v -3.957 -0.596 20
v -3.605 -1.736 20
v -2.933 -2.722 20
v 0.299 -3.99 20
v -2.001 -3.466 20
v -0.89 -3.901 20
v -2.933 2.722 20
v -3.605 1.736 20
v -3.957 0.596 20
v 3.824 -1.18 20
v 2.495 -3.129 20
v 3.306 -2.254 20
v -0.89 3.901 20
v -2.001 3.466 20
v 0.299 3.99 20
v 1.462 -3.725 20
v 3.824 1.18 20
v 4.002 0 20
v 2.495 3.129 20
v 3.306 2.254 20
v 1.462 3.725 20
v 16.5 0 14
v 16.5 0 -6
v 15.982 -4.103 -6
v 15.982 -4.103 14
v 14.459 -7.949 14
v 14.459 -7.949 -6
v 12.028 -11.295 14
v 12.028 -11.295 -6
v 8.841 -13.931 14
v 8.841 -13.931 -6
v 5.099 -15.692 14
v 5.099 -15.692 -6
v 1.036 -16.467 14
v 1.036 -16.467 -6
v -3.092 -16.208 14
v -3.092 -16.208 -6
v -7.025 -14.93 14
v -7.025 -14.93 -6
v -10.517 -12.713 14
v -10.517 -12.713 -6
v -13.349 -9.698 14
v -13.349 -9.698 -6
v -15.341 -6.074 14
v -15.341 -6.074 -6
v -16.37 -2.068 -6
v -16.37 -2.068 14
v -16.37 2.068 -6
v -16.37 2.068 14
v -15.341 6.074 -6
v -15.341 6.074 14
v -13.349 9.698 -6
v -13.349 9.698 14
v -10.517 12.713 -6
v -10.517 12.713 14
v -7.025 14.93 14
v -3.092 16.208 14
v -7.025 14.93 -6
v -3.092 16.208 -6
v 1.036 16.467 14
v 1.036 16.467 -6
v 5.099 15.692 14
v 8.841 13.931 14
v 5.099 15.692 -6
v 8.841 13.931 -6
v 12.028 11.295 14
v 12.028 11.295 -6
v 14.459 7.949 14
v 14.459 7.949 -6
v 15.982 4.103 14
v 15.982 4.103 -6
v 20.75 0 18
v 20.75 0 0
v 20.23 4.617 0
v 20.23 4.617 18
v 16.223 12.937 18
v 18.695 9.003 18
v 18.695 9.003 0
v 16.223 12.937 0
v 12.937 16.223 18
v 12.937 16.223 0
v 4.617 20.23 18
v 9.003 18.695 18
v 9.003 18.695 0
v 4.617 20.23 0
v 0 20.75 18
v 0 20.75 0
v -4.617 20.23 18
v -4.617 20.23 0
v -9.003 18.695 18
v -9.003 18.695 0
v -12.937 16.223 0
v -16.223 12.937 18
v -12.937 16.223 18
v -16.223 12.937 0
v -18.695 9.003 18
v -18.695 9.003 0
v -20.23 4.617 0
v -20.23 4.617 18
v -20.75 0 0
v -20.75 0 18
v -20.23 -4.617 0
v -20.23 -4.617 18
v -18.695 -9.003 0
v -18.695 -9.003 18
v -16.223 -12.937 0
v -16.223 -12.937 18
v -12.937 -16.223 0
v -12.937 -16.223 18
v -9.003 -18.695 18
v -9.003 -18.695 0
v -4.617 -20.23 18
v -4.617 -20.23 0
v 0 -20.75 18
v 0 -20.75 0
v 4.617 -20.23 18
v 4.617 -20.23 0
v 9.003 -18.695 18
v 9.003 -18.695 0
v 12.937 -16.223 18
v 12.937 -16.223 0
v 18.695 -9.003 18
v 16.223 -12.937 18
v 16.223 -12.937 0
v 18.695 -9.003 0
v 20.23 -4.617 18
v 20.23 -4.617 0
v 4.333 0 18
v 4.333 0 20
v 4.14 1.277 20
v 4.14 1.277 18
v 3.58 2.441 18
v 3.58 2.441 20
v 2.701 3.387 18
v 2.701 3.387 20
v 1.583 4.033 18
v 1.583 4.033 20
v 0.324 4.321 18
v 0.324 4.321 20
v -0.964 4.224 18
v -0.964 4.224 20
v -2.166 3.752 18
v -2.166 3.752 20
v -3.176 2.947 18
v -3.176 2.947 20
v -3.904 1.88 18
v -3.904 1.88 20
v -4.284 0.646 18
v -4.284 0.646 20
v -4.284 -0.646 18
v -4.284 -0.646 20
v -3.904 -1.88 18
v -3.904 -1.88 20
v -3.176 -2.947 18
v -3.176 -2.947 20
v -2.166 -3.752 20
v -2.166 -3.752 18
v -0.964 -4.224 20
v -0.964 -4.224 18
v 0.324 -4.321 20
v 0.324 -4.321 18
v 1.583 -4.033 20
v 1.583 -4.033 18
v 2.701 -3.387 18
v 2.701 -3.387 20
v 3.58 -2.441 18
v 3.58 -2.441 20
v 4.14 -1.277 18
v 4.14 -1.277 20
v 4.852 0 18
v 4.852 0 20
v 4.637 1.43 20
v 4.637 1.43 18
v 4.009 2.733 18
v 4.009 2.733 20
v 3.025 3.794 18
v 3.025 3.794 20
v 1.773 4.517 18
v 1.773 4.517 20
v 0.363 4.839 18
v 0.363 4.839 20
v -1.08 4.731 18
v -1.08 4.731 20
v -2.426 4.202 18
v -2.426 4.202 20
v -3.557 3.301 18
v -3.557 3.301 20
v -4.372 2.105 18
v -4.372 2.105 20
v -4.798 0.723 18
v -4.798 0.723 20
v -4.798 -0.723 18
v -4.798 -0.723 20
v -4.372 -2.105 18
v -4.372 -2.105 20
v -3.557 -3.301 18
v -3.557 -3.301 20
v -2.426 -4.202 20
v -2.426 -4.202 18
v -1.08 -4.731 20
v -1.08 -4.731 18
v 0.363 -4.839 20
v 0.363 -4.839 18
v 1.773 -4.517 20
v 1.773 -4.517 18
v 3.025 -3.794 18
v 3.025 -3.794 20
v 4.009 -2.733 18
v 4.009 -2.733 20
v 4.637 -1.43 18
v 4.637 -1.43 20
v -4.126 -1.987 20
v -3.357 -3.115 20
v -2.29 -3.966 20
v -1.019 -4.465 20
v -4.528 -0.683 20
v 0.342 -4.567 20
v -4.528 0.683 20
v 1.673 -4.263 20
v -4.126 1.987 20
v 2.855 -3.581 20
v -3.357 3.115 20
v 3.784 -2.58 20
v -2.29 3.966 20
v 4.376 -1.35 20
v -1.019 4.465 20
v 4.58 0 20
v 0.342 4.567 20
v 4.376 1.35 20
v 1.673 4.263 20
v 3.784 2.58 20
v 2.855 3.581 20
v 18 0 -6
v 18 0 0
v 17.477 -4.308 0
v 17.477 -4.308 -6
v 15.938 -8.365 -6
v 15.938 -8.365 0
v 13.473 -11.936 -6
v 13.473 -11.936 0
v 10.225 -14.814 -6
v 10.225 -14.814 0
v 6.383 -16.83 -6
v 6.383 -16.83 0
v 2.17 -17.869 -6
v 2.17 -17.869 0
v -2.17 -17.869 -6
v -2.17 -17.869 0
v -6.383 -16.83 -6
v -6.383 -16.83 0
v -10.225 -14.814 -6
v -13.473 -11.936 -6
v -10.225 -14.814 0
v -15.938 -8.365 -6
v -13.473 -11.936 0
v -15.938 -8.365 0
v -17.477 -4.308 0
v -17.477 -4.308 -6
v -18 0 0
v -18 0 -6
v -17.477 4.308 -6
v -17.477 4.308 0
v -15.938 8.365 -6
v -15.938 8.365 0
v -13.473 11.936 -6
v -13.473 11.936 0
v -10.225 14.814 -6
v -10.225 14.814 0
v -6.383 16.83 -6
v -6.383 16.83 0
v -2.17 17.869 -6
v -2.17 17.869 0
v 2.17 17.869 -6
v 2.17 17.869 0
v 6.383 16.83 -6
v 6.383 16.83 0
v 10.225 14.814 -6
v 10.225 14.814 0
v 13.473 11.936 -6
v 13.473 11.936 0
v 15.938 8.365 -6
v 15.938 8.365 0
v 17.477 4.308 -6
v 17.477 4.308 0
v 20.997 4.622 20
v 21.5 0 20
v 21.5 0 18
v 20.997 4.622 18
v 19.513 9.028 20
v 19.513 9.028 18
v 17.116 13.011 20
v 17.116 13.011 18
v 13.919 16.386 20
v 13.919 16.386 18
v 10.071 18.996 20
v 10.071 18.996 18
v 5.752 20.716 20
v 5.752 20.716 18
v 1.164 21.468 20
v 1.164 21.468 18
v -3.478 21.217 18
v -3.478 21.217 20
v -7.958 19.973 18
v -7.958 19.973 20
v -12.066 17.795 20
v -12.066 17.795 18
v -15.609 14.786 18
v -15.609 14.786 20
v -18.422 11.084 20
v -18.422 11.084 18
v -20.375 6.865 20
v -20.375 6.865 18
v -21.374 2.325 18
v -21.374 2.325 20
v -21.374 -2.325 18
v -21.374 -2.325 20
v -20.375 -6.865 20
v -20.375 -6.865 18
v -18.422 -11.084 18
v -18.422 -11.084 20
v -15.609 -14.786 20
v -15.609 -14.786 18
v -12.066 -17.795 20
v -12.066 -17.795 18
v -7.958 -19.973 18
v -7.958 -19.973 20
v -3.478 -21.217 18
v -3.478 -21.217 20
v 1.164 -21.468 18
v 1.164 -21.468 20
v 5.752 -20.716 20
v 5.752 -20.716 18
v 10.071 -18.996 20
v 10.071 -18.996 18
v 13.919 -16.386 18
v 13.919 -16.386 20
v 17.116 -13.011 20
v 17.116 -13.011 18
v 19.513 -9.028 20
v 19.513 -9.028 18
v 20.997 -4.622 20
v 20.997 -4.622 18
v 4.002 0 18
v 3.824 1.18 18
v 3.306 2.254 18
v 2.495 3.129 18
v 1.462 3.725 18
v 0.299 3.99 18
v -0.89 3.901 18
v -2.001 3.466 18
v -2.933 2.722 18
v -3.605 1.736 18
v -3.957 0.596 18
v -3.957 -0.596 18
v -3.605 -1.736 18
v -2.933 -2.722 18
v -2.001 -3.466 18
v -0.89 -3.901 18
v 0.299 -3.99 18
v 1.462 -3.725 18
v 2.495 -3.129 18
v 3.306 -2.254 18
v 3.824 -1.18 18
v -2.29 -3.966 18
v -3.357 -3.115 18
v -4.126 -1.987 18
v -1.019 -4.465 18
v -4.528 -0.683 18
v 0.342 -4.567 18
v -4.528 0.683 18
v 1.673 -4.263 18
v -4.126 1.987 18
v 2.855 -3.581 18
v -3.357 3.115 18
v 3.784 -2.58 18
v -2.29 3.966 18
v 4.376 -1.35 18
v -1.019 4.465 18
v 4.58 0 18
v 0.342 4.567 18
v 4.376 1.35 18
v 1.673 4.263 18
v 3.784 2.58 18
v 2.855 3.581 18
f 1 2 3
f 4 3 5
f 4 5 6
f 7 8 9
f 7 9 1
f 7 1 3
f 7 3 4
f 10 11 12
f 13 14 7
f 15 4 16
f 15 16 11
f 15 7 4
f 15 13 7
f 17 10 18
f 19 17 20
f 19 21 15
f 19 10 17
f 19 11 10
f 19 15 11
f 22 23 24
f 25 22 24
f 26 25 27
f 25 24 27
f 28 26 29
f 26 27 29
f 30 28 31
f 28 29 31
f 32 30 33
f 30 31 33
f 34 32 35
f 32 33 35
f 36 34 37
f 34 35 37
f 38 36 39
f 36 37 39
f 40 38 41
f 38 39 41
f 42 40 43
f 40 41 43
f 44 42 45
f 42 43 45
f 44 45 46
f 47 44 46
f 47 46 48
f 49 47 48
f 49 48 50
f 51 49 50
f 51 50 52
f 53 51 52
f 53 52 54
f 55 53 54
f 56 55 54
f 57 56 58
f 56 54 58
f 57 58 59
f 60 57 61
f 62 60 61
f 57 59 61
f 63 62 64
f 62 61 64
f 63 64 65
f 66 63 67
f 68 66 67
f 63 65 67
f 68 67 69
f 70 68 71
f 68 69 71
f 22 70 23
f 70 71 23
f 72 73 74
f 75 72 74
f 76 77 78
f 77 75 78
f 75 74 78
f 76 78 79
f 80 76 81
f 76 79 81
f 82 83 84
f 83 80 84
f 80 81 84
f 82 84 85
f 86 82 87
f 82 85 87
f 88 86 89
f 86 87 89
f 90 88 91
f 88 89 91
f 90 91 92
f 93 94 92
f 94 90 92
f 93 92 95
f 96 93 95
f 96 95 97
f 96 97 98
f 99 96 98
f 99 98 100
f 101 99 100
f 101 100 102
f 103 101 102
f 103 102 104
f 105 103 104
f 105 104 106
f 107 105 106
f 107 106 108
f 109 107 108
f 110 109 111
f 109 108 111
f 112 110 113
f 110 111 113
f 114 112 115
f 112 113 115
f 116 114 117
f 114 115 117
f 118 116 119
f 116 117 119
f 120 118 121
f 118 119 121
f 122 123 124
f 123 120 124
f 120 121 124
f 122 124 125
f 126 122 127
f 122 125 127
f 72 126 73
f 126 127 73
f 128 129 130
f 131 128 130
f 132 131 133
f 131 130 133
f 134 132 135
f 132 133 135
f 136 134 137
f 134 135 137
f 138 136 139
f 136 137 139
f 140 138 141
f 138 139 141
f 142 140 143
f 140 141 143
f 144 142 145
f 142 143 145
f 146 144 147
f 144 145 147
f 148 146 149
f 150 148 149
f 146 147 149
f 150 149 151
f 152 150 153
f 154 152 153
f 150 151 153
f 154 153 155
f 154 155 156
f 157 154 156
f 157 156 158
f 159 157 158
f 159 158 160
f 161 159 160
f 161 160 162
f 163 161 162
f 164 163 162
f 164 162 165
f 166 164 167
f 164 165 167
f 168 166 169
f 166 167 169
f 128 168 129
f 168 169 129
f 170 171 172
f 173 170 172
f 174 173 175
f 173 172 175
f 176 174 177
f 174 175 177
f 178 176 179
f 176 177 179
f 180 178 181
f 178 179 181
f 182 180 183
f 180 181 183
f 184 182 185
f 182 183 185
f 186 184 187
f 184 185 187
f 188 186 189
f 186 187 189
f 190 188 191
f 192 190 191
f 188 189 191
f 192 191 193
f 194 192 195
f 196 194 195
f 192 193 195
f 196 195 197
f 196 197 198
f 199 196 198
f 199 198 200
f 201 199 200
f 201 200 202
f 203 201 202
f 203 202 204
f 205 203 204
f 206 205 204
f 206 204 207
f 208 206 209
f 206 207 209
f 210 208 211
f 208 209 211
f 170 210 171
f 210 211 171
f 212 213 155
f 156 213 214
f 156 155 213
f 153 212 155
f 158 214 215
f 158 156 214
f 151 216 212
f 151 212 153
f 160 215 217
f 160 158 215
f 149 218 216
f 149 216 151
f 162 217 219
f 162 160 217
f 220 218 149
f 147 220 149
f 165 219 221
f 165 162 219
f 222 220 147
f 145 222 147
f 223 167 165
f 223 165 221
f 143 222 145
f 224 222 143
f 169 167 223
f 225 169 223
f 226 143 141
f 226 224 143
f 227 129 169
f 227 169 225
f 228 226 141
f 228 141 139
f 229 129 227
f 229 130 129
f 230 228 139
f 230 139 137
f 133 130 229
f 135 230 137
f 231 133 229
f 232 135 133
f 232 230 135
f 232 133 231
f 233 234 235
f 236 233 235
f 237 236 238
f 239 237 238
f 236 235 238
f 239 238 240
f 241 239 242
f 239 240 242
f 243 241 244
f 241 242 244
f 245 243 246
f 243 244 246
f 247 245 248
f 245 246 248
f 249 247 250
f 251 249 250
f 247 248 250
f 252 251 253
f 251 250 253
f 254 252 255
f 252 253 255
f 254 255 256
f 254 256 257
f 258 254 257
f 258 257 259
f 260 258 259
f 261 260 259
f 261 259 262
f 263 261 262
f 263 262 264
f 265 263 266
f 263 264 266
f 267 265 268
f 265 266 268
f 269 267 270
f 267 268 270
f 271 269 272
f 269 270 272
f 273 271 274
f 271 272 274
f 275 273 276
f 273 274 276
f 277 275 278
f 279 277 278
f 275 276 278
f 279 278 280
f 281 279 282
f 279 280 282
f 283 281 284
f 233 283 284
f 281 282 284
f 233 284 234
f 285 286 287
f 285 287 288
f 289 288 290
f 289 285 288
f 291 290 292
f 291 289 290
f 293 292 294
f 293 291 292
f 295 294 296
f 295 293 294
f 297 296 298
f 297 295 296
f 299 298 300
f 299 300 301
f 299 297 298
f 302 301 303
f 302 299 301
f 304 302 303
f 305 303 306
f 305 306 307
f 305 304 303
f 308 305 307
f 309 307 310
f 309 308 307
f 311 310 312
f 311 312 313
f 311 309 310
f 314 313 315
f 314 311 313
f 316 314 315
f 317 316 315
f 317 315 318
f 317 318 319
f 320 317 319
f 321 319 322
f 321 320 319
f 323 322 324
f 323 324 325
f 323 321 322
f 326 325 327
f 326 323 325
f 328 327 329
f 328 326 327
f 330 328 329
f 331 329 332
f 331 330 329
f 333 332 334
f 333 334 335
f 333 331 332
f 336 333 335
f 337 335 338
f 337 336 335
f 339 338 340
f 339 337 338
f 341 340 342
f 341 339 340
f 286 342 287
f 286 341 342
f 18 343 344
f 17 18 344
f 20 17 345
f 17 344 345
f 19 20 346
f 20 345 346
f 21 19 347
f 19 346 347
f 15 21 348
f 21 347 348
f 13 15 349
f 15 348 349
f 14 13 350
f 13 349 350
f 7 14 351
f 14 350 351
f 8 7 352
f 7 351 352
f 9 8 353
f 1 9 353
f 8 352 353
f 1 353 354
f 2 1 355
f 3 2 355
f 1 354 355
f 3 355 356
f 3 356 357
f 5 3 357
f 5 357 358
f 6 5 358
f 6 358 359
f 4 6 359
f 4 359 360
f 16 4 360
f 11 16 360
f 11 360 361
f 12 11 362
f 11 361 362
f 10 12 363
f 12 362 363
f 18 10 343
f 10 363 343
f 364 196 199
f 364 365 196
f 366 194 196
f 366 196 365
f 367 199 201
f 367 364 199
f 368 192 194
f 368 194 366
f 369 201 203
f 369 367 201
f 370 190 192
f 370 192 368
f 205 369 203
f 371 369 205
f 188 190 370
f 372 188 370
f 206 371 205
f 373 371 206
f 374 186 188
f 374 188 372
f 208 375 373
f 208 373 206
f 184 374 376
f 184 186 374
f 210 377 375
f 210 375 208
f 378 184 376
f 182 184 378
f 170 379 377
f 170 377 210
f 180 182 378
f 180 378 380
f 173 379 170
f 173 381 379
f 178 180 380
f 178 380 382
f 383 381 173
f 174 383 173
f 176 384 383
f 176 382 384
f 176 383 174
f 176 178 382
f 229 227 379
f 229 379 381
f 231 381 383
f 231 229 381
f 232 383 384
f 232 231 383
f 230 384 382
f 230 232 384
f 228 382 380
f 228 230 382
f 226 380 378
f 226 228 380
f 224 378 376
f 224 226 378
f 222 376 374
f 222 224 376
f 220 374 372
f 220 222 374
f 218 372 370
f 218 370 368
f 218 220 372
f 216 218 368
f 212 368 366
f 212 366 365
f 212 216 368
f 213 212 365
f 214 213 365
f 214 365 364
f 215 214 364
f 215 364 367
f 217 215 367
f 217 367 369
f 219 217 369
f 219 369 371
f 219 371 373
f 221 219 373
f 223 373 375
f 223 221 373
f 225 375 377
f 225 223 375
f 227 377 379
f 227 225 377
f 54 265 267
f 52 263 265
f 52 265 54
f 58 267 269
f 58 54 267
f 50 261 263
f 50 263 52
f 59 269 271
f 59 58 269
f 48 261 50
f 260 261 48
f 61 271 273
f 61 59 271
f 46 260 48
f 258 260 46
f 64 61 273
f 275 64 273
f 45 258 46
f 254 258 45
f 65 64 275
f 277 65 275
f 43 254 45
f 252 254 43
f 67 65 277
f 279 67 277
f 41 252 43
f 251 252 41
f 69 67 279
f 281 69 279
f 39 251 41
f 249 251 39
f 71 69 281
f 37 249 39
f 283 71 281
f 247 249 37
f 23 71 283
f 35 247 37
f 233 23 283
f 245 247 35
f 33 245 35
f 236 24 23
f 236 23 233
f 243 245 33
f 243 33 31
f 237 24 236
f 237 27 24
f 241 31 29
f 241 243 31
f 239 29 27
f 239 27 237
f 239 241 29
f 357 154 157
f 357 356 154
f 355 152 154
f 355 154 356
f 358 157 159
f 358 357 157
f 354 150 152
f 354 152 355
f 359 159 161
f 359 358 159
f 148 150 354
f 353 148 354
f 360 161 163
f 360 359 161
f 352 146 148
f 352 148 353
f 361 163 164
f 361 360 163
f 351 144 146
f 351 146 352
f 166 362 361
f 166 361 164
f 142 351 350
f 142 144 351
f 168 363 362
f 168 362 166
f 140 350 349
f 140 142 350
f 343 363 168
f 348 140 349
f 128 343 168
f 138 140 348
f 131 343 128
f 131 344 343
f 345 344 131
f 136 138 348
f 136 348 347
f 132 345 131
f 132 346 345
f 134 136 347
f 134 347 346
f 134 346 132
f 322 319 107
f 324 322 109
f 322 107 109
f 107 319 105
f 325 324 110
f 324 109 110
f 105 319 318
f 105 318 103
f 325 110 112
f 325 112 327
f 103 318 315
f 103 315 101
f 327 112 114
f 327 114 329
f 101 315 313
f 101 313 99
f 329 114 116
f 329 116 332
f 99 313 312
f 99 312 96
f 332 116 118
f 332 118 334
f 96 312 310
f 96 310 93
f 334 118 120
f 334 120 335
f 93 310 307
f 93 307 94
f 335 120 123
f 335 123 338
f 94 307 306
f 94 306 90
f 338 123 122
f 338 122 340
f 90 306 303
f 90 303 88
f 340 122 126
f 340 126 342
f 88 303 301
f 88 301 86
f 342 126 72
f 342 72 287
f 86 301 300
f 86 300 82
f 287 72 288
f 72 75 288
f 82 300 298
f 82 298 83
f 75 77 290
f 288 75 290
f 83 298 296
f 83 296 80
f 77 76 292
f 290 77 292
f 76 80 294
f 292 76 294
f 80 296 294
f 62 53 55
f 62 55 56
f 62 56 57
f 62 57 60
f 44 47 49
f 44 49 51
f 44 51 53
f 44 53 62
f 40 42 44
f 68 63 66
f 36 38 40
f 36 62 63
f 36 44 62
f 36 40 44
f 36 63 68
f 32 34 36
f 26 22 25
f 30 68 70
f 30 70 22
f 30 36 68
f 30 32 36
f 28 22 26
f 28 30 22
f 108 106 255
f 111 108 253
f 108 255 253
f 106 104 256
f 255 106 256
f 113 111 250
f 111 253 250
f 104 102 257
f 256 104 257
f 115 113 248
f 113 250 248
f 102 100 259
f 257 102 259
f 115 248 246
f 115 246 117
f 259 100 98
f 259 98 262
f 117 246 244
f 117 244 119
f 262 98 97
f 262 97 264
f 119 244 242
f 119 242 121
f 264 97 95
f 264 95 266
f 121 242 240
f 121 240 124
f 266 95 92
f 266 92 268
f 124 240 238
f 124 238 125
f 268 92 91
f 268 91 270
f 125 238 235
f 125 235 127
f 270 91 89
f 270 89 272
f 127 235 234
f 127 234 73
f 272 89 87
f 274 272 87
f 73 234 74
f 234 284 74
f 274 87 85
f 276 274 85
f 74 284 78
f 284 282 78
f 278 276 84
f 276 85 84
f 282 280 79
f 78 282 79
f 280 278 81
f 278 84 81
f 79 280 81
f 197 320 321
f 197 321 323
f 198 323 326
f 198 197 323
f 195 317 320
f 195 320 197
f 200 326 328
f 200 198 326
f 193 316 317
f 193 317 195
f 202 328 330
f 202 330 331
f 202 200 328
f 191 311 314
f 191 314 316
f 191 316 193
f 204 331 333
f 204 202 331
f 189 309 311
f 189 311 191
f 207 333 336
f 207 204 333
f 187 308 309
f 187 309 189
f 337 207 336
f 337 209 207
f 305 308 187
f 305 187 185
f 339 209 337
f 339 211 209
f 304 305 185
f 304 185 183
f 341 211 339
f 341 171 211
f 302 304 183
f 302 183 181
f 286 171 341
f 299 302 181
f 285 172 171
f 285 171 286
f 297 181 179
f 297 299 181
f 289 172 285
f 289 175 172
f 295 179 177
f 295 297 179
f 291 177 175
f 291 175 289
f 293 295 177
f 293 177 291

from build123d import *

# Parameters (mm, degrees)
F0_R      = 20.75
F1_DEPTH  = 20
F2_R      = 18
F3_DEPTH  = 6
F4_R      = 21.5
F5_DEPTH  = 2
F6_R      = 4.332633
F7_DEPTH  = 2
F8_R      = 16.5
F9_DEPTH  = 20
F10_R     = 4.852461
F10_R_2   = 4.579642
F11_DEPTH = 2
F12_R     = 4.001632
F13_DEPTH = 2


with BuildPart() as f1:
    # F0 (on Top) → F1 (new body)
    with BuildSketch(Plane.XY):
        Circle(F0_R)
    extrude(amount=F1_DEPTH)

    # F2 (on face) → F3 (join)
    with BuildSketch(Plane(origin=(0, 0, 0), x_dir=(1, 0, 0), z_dir=(0, 0, -1))):
        Circle(F2_R)
    extrude(amount=F3_DEPTH)

    # F4 (on face) → F5 (join)
    with BuildSketch(Plane.XY.offset(20)):
        Circle(F4_R)
    extrude(amount=-F5_DEPTH)

    # F6 (on face) → F7 (cut)
    with BuildSketch(Plane.XY.offset(20)):
        Circle(F6_R)
    extrude(amount=-F7_DEPTH, mode=Mode.SUBTRACT)

    # F8 (on face) → F9 (cut)
    with BuildSketch(Plane(origin=(0, 0, -6), x_dir=(1, 0, 0), z_dir=(0, 0, -1))):
        Circle(F8_R)
    extrude(amount=-F9_DEPTH, mode=Mode.SUBTRACT)

    # F10 (on face) → F11 (cut)
    with BuildSketch(Plane.XY.offset(20)):
        Circle(F10_R)
        Circle(F10_R_2, mode=Mode.SUBTRACT)
    extrude(amount=-F11_DEPTH, mode=Mode.SUBTRACT)

    # F12 (on face) → F13 (join)
    with BuildSketch(Plane.XY.offset(18)):
        Circle(F12_R)
    extrude(amount=F13_DEPTH)


solid = f1.part
